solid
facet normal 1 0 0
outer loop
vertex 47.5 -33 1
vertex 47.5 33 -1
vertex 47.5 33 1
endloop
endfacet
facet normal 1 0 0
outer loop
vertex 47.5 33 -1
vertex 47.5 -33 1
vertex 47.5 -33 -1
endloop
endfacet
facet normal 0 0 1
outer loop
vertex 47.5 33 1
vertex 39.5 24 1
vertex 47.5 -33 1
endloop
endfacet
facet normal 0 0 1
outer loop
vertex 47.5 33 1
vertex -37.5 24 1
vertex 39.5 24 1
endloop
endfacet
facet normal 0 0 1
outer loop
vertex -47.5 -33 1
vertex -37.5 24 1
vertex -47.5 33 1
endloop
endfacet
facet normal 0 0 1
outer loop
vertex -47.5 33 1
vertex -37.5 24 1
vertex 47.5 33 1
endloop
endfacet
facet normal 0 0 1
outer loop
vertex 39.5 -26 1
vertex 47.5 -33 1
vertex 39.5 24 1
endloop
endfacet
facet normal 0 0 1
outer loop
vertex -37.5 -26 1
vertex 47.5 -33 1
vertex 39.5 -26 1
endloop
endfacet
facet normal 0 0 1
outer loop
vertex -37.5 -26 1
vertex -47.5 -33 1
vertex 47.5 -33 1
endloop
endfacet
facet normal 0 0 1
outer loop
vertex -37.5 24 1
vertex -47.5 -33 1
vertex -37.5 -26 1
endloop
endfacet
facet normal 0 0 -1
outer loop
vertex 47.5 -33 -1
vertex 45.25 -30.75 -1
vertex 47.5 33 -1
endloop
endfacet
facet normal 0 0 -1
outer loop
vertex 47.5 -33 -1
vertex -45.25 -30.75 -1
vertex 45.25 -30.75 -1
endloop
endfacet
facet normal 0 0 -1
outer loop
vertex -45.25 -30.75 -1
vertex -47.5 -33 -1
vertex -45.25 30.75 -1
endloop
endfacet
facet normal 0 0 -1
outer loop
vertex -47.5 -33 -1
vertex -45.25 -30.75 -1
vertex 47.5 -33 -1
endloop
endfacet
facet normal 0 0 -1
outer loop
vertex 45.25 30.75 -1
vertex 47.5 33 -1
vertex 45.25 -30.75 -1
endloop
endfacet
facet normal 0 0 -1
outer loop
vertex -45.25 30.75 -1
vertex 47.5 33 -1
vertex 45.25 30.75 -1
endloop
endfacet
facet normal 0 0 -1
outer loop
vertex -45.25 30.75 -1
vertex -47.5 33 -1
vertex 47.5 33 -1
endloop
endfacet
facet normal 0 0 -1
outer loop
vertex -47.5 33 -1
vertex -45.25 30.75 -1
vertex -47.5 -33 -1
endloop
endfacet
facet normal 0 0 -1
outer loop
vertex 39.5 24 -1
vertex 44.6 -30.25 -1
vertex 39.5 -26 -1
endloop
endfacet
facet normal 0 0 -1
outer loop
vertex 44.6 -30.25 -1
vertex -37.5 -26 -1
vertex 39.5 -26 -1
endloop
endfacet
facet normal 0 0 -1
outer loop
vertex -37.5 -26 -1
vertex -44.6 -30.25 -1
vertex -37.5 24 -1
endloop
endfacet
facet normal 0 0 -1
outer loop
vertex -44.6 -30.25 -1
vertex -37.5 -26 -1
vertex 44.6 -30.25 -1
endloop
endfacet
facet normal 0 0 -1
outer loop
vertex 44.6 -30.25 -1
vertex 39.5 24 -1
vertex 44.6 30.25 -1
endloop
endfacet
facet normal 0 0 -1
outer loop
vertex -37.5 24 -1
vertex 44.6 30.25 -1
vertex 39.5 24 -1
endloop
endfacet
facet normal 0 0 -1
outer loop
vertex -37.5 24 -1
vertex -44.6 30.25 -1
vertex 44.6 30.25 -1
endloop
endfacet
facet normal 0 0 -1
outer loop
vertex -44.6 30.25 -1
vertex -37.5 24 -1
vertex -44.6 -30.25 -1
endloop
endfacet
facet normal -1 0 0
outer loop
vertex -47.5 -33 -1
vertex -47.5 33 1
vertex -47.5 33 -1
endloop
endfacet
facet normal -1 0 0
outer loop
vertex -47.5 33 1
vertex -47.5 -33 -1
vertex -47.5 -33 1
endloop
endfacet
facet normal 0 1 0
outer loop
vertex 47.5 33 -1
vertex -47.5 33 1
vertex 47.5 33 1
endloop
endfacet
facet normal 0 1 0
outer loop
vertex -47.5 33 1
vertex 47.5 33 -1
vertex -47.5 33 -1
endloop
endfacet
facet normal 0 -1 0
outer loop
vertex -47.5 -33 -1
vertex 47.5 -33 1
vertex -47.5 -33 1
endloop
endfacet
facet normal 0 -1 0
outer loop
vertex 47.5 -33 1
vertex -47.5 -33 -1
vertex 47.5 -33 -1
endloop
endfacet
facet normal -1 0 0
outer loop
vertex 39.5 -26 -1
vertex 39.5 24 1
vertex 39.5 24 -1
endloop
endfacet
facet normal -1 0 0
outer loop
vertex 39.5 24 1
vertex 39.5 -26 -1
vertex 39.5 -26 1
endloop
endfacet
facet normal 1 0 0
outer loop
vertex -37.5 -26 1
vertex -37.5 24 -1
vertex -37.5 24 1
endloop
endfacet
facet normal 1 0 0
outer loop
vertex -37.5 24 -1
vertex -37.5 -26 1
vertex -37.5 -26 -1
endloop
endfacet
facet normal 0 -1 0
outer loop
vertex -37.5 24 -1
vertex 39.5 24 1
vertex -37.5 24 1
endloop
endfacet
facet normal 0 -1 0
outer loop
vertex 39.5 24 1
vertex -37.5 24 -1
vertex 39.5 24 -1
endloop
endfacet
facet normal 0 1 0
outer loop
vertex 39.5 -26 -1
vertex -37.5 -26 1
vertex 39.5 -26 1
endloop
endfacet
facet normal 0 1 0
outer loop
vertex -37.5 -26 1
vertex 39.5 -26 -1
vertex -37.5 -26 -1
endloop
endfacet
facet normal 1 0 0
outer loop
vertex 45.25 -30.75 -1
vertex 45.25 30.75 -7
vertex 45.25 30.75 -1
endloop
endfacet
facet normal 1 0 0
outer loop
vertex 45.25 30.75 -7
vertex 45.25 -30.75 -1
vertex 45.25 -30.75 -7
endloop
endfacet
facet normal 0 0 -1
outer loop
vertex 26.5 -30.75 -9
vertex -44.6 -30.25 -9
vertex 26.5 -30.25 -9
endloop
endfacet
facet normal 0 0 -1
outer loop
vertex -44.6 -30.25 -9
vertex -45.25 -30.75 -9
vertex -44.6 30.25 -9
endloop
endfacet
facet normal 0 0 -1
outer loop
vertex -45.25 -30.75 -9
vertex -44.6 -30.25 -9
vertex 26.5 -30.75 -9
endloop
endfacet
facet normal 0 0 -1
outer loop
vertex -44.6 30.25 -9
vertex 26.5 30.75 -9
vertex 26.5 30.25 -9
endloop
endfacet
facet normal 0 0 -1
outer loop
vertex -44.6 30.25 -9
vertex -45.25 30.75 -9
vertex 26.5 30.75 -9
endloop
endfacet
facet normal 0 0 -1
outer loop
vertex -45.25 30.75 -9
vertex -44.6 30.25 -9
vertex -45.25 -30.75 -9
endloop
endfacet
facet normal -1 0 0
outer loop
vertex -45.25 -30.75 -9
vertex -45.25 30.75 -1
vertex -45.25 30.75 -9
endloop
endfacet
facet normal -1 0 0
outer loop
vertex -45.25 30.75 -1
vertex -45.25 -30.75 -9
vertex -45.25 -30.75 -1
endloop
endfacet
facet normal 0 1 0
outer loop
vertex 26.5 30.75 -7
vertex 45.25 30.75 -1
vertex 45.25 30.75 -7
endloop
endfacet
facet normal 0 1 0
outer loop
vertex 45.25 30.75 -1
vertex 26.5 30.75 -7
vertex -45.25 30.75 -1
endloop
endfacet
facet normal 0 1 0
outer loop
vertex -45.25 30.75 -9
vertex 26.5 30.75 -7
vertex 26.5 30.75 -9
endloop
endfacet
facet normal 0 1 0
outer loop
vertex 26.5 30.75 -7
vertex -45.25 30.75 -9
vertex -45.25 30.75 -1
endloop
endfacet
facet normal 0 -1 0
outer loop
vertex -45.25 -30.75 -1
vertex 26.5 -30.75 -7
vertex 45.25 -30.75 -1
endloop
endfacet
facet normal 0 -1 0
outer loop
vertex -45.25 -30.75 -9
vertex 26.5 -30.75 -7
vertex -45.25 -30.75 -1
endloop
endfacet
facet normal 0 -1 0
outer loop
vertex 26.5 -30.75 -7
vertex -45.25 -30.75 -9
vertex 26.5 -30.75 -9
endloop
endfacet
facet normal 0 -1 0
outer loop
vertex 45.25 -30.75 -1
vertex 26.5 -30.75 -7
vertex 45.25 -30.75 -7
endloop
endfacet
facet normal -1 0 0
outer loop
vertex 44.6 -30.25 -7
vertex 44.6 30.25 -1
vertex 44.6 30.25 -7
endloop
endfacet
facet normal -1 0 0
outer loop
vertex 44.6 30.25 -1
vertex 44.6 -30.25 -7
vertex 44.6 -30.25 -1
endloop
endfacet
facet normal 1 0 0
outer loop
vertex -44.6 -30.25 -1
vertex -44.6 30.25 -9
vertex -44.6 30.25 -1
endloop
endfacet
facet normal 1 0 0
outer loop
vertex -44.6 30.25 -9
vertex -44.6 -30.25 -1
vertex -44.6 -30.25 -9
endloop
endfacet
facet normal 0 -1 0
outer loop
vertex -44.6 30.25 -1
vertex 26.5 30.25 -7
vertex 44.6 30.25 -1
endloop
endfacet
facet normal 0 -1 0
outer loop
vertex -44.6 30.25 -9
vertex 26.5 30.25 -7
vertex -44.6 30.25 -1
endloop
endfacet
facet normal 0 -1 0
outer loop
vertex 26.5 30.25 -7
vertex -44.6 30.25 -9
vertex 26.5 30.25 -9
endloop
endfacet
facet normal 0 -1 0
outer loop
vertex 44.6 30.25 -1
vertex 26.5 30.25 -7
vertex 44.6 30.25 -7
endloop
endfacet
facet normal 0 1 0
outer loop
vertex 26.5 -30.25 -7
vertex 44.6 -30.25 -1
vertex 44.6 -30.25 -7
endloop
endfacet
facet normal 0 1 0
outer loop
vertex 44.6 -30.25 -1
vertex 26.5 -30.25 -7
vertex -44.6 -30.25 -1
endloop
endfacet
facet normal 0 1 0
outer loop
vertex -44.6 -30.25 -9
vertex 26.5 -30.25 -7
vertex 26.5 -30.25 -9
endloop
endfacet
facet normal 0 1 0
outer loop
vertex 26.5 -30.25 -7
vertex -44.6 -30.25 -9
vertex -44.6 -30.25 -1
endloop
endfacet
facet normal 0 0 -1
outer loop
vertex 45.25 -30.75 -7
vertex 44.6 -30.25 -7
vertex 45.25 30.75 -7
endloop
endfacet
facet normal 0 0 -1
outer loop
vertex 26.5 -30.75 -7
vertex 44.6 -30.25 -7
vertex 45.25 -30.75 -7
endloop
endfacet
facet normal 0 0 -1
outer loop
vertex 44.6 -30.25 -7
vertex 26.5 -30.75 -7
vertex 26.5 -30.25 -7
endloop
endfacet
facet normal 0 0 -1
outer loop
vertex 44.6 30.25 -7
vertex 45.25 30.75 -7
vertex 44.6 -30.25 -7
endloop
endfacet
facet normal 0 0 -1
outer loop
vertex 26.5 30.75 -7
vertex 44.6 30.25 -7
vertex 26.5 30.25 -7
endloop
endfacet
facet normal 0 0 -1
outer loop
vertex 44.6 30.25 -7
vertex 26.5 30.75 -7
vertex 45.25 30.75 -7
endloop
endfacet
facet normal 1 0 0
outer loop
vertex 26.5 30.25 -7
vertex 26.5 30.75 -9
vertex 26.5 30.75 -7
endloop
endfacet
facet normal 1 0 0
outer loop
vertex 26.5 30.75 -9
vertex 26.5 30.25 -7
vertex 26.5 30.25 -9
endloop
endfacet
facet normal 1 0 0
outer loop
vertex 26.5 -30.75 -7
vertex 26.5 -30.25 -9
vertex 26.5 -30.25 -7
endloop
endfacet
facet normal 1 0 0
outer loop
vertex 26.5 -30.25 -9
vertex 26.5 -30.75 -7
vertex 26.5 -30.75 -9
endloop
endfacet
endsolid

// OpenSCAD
// file: Funnel - empty.scad
$fn=400;

module panel_insert_funnel(t, fh, fdt, fdb) {

    difference() {
        color("lightblue")
        cylinder(h=fh + t, r1=fdb / 2 + t, r2=fdt / 2 + t);

        color("red")
        translate([0, 0, t])
        cylinder(h=fh + 1, r1=fdb / 2, r2=fdt / 2);
    }
};
// main file
$fn=100;

use <./Funnel - empty.scad>;

pi_material_thickness = 2;
pi_funnel_height = 30;
pi_funnel_ring_diameter = 165;
pi_funnel_hole_diameter = 130;
pi_funnel_bottom_diameter = 100;
pi_pi3_width=85;
pi_pi3_depth=56;

pi_draw="cover"; // "funnel" or "cover"

module screw_mount() {
    difference() {
        cylinder(h=4, r=2.5);
        cylinder(h=5, r=0.5);
    }
};

// e = enlargement. When e=0 the case will have the exact size if the raspberry pi. 
// h = The high of the case. Please consider, that the screw-mounts has the high of 4 mm and you hava th add the material thickness of the bottom.
//     When you need the high of 25mm for your raspberry you have to use: 25 + t + 4.
module raspi3_case(w, d, e, h, t) {
     
    pi3_case_width=w + e;
    pi3_case_depth=d + e;

    pi3_case_point0x = - pi3_case_width / 2 - t;
    pi3_case_point0y = - pi3_case_depth / 2 - t;

    difference() {
        
        // The outside measure of the case
        translate([0, 0, h / 2])
        cube([pi3_case_width + t * 2, pi3_case_depth + t * 2, h], center=true);

        // The inner outcut of the case
        translate([0, 0, h / 2 + t])
        cube([pi3_case_width, pi3_case_depth, h], center=true);

        // The cutout at the bottom
        color("red")
        translate([0, 0, 1])
        cube([w - 16, d - 16, t + 2], center=true);

        // The hole for the usb power connector
        color("red")
        translate([pi3_case_point0x + e / 2 + 5, pi3_case_point0y - 1, t + 2])
        cube([20, t + 2, 13]);

    }


    // Screw bottom left
    translate([pi3_case_point0x + t + 3.5 + e / 2, pi3_case_point0y + t + 3.5 + e / 2, t])
    screw_mount();

    // Screw bottom right
    translate([pi3_case_point0x + t + 3.5 + 58 + e / 2, pi3_case_point0y + t + 3.5 + e / 2, t])
    screw_mount();

    // Screw top left
    translate([pi3_case_point0x + t + 3.5 + e / 2, pi3_case_point0y + t + 3.5 + 49 + e / 2, t])
    screw_mount();

    // Screw top right
    translate([pi3_case_point0x + t + 3.5 + 58 + e / 2, pi3_case_point0y + t + 3.5 + 49 + e / 2, t])
    screw_mount();
};

module raspi3_cover(w, d, e, t) {
    pi3_case_width=w + e;
    pi3_case_depth=d + e;

    echo(pi3_case_depth);

    pi3_case_point0x = - pi3_case_width / 2 - t;
    pi3_case_point0y = - pi3_case_depth / 2 - t;

    difference() {
        cube([pi3_case_width + t * 2, pi3_case_depth + t * 2, t], center=true);

        color("red")
        translate([pi3_case_point0x + 10, pi3_case_point0y + 7, - t])
        cube([77, 50, t + 2], center=false);
    }

    difference() {
        // The inner frame
        color("pink")
        translate([0, 0, - t - 3])
        cube([pi3_case_width - 0.5, pi3_case_depth - 0.5,8], center=true);

        // The inner frame outcut
        color("red")
        translate([0, 0, - t - 3])
        cube([pi3_case_width - 1.8, pi3_case_depth - 1.5, 16], center=true);
        
        // The outcut for USB
        color("green")
        translate([pi3_case_width / 2 - 9, 0, 0-t-8-5])
        cube([20, pi3_case_depth + 2, 16], center=true);
    }
};


module funnel() {

    difference() {

        // Create the funnel
        translate([0, 0, - pi_funnel_height - pi_material_thickness])
        panel_insert_funnel(pi_material_thickness, pi_funnel_height, pi_funnel_hole_diameter, pi_funnel_bottom_diameter);

        // Cut out the same size as the raspberry pi case
        color("pink")
        translate([0, 0, -20])
        cube([91, 62, 31], center=true);

        // Cutout the tunnel for the usb power
        color("green")
        translate([-39.5, -100, -27])
        cube([20, 100, 13]);

    }

    // Add the raspberry pi case
    translate([0, 0, -32])
    raspi3_case(pi_pi3_width, pi_pi3_depth, 6, 31, 2);
};

module cover() {
    raspi3_cover(pi_pi3_width, pi_pi3_depth, 6, pi_material_thickness);

};

// if (pi_draw=="funnel") {
//     funnel();
// };

// if (pi_draw=="cover") {
//     cover();
// };

// funnel();
// translate([0,0,5])
cover();
